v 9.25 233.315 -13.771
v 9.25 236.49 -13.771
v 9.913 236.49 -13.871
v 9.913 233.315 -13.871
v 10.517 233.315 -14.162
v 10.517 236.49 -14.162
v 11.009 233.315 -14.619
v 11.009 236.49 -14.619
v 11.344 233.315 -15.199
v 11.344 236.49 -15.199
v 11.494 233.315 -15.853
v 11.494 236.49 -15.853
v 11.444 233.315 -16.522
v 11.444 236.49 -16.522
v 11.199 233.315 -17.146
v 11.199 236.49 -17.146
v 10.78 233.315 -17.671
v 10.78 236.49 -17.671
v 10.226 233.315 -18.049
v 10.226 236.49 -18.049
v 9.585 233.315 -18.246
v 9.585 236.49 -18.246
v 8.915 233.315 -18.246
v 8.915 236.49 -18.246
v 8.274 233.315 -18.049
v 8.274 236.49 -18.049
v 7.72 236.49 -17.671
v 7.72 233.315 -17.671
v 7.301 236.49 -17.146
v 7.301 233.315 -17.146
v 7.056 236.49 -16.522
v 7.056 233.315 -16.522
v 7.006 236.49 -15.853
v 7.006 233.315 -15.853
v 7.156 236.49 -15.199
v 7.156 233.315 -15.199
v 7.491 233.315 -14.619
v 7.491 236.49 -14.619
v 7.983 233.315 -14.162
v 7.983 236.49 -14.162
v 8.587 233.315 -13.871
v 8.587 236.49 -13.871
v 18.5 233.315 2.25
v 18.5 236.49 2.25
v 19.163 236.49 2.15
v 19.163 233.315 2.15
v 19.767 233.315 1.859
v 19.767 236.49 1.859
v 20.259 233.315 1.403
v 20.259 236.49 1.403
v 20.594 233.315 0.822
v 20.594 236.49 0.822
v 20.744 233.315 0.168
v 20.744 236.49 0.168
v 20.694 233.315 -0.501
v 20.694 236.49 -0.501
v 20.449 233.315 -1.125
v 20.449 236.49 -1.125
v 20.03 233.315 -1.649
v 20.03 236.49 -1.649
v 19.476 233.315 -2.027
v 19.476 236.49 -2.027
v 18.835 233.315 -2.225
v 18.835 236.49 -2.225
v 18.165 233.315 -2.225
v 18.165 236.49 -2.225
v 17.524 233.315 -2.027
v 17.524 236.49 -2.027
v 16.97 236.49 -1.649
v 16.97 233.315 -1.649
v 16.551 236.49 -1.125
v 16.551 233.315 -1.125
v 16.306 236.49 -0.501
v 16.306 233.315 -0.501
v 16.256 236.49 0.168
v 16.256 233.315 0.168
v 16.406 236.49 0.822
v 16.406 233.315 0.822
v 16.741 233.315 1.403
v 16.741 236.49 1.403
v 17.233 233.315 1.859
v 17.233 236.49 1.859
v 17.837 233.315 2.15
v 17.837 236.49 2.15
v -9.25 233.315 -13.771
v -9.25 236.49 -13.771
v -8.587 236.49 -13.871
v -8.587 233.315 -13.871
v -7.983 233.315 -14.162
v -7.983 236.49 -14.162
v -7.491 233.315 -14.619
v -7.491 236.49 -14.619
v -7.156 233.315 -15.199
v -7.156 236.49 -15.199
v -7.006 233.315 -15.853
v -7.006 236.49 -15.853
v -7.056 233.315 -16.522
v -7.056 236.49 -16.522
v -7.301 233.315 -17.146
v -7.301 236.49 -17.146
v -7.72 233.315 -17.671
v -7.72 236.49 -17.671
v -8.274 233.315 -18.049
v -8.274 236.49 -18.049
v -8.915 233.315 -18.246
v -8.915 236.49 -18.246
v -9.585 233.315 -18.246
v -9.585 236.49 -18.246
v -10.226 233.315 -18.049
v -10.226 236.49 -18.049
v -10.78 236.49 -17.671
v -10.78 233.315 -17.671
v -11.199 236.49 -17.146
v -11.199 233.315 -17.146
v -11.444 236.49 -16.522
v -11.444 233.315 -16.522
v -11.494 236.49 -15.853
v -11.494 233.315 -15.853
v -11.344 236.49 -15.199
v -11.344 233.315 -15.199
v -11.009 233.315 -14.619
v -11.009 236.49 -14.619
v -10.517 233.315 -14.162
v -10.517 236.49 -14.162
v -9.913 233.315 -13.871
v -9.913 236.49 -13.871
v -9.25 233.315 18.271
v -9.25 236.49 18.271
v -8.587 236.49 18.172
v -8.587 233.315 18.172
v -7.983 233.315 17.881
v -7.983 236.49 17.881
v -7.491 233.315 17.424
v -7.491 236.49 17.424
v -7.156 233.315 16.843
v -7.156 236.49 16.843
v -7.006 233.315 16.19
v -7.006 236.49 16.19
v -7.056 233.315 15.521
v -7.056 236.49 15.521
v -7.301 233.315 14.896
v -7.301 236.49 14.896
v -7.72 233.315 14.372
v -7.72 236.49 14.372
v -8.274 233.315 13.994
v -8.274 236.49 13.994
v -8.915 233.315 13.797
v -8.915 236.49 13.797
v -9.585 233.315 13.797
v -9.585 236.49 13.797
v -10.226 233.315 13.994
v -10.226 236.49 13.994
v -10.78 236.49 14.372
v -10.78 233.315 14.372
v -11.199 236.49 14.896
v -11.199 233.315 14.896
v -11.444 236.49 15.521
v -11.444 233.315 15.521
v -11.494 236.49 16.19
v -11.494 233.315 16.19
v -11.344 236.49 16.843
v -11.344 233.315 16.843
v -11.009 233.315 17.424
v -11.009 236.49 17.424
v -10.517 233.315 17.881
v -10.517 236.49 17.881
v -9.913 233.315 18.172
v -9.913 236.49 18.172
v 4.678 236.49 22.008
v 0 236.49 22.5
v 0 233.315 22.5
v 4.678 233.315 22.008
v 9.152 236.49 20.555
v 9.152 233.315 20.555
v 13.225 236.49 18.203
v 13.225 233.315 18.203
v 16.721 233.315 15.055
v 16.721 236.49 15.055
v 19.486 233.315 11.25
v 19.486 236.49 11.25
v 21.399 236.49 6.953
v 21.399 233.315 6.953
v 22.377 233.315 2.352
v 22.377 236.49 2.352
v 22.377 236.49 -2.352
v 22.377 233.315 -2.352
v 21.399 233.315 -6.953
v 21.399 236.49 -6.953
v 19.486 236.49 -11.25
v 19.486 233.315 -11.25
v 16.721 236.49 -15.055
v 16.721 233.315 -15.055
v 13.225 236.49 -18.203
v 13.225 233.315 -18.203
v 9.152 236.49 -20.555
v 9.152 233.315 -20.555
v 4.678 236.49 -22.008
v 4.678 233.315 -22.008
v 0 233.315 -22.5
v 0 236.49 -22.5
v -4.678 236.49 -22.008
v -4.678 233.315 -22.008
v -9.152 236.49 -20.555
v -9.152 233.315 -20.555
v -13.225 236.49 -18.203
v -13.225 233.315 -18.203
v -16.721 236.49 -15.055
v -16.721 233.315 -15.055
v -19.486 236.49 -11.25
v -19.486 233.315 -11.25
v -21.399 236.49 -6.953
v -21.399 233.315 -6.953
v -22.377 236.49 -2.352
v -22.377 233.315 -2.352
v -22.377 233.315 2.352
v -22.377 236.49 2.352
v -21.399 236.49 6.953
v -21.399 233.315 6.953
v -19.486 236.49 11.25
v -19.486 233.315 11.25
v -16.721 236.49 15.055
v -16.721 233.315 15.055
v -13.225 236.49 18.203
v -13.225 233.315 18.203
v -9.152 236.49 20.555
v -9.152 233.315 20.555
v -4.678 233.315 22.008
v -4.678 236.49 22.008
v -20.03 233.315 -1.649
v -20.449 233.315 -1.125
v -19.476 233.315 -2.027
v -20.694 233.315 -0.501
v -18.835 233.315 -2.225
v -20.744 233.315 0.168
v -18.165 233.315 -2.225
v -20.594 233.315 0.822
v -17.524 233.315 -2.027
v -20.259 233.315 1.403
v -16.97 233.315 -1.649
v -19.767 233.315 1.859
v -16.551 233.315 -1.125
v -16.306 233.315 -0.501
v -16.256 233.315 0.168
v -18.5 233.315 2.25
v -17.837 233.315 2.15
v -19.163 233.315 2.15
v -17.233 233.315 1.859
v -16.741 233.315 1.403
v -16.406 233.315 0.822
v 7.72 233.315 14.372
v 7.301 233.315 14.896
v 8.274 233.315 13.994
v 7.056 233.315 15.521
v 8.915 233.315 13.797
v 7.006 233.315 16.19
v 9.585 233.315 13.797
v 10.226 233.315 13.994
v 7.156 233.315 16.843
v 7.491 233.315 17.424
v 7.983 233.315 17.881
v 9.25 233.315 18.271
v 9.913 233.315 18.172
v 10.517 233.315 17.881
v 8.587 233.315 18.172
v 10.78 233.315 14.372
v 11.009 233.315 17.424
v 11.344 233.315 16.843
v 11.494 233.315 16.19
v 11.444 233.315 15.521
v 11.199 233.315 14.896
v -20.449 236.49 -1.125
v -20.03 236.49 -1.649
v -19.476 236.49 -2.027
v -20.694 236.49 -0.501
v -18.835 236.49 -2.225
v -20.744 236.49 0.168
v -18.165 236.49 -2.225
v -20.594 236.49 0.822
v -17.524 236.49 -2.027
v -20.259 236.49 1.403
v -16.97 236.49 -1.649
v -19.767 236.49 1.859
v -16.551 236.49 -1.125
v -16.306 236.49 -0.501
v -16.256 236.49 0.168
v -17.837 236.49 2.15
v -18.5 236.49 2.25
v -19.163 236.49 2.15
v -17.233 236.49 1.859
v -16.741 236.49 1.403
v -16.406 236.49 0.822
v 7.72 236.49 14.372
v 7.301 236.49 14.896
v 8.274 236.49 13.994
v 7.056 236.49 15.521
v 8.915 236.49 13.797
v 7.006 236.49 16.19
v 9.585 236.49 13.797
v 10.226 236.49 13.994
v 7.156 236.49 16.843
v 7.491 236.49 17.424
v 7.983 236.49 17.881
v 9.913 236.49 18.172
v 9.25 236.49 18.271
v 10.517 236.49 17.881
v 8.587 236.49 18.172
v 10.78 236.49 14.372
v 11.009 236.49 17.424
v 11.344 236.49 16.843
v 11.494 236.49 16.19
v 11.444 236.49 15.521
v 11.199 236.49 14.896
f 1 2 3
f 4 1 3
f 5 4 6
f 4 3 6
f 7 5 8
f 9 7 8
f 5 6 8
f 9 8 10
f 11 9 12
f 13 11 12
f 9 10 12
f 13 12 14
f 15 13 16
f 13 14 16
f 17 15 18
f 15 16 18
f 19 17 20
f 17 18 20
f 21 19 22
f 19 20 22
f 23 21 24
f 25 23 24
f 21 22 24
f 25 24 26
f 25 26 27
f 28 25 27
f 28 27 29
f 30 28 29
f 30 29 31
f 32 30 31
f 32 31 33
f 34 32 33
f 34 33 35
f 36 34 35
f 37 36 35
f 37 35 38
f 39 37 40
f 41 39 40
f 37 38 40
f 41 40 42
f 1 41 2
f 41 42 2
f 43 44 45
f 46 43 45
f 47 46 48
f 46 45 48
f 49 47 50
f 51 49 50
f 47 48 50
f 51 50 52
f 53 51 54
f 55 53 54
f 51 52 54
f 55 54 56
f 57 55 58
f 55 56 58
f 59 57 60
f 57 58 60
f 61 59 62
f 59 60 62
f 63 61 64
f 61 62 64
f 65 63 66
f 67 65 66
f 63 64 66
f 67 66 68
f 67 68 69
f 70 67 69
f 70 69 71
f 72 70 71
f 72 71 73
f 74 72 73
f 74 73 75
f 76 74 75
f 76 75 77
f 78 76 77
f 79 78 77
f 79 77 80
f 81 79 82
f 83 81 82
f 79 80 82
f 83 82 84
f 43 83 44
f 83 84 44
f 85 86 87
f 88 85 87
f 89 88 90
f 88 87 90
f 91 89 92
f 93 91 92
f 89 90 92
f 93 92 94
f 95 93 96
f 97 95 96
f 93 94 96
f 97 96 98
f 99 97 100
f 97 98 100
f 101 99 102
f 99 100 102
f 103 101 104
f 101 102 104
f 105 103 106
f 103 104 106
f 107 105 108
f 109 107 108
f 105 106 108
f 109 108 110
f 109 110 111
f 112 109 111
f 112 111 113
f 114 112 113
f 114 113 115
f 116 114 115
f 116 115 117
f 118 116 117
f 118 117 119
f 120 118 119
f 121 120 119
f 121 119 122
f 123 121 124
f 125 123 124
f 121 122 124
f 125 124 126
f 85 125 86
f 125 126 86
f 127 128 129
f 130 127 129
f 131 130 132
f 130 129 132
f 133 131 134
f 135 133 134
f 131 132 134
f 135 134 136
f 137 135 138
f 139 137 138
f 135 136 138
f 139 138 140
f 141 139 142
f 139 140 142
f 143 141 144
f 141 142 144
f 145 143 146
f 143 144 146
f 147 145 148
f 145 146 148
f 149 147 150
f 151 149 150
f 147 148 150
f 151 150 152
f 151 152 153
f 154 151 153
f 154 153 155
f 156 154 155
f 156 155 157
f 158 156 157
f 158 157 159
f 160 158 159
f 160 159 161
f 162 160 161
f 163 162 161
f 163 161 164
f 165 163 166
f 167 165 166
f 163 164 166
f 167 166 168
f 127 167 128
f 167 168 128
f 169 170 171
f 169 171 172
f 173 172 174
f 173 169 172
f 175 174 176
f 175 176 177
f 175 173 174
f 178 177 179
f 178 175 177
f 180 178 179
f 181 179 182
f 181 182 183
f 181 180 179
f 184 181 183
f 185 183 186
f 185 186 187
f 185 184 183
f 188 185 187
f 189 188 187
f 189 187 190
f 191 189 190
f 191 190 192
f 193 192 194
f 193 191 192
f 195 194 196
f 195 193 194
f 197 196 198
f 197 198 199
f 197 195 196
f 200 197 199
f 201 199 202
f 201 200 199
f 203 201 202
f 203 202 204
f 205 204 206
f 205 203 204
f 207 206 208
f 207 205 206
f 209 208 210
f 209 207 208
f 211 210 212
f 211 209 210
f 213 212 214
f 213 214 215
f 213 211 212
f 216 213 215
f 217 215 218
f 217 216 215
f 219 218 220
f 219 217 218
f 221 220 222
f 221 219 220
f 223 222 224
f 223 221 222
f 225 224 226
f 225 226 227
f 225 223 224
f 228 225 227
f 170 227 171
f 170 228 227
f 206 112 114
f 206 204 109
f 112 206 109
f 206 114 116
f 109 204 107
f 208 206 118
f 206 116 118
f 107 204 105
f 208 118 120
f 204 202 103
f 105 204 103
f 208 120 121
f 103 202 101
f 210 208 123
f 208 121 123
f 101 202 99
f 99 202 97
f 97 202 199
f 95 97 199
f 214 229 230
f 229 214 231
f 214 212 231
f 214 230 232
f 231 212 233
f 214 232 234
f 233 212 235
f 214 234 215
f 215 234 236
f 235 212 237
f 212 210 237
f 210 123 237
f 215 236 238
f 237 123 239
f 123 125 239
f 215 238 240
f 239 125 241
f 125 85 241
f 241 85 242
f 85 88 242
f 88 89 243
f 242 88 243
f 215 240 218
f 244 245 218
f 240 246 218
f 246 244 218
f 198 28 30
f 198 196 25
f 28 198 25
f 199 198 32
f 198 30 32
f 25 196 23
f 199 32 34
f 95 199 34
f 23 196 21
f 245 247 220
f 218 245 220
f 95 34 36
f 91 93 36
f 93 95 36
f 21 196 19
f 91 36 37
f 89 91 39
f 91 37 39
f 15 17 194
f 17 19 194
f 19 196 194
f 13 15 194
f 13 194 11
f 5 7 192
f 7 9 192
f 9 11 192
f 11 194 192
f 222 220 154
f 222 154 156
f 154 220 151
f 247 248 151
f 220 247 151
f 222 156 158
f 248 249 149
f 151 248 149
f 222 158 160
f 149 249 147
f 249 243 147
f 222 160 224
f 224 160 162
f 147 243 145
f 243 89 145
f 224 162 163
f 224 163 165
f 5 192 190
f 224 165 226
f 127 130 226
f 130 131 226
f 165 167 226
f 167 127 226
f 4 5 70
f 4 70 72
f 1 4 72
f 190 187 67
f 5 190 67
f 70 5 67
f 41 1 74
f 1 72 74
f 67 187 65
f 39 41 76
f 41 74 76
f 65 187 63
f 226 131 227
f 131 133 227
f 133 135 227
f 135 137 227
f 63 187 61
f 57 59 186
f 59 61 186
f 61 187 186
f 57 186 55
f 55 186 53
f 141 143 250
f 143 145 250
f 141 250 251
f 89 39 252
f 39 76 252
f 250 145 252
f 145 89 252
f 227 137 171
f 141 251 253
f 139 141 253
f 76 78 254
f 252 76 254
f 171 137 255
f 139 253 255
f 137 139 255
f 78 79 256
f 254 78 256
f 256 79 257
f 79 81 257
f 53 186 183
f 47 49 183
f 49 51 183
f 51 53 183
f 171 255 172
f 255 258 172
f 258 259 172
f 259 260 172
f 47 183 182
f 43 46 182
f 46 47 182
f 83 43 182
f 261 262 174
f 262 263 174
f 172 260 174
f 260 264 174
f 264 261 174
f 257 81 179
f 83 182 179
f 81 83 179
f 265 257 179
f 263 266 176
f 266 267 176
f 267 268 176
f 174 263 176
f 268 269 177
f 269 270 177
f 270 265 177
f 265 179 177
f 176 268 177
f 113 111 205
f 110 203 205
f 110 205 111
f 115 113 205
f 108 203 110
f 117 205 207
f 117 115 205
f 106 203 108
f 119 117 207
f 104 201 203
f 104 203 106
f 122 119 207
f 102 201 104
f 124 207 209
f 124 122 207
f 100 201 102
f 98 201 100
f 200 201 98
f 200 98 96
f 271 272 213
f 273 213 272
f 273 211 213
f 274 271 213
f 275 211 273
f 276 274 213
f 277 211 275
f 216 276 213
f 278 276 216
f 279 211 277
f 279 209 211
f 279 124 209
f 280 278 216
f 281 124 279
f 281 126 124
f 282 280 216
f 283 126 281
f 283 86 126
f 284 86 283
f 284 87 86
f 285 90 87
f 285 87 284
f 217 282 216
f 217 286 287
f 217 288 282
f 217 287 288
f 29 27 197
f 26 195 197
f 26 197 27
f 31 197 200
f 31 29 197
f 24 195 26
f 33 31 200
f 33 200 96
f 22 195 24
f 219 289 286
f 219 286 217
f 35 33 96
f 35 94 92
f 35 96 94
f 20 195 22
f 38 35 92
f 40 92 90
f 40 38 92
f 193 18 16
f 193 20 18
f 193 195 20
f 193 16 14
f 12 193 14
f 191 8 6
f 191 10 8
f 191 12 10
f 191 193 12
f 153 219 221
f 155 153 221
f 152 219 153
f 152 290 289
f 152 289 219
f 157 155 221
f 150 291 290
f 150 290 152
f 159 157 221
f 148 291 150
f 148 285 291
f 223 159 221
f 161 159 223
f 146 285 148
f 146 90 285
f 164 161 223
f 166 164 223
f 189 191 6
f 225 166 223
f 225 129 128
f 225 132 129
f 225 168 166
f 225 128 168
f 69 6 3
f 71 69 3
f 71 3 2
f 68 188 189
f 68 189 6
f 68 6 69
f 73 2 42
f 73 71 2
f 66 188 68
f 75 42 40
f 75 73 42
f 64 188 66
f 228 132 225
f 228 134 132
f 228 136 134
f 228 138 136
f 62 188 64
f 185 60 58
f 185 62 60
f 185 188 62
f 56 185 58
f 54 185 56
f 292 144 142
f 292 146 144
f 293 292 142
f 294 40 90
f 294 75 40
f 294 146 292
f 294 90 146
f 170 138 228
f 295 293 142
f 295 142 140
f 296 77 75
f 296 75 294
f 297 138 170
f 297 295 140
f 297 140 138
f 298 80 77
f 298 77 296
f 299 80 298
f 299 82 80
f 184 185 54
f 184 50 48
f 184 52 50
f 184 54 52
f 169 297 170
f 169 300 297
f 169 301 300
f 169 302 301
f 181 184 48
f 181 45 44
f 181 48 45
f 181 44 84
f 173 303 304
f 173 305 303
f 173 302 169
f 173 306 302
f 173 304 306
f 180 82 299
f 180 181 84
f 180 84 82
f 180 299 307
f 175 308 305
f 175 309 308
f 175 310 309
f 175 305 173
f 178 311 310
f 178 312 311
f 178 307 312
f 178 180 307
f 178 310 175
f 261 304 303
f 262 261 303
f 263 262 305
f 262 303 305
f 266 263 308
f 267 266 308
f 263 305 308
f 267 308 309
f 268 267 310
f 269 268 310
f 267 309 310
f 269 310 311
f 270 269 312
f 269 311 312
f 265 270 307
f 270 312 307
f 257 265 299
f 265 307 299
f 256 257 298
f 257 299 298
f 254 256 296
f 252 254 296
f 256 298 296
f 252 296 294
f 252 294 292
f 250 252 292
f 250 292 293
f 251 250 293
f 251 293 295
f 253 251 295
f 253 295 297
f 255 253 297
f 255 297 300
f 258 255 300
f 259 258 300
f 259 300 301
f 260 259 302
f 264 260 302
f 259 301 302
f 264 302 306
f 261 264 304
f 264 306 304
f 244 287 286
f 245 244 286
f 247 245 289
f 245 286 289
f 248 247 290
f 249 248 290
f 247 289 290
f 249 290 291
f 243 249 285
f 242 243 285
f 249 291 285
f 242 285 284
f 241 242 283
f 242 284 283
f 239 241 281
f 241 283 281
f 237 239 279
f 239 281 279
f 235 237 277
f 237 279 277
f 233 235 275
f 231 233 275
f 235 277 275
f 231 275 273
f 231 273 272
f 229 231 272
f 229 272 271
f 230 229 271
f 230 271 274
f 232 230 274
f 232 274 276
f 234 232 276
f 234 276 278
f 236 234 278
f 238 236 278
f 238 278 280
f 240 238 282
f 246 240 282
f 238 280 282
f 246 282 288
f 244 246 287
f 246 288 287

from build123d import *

# Parameters (mm, degrees)
SKETCH2_R           = 22.5
SKETCH2_R_2         = 2.25
BOSS_EXTRUDE1_DEPTH = 3.175


with BuildPart() as part:
    # Sketch2 → Boss-Extrude1 (new body)
    with BuildSketch(Plane(origin=(0, 236.49, 0), x_dir=(1, 0, 0), z_dir=(0, 1, 0))):
        with Locations(Location((0, 0, 0), (0, 0, 270))):
            Circle(SKETCH2_R)
        with Locations(Location((9.25, 16.02146997, 0), (0, 0, 270))):
            Circle(SKETCH2_R_2, mode=Mode.SUBTRACT)
        with Locations(Location((18.5, 0, 0), (0, 0, 270))):
            Circle(SKETCH2_R_2, mode=Mode.SUBTRACT)
        with Locations(Location((9.25, -16.02146997, 0), (0, 0, 270))):
            Circle(SKETCH2_R_2, mode=Mode.SUBTRACT)
        with Locations(Location((-9.25, -16.02146997, 0), (0, 0, 270))):
            Circle(SKETCH2_R_2, mode=Mode.SUBTRACT)
        with Locations(Location((-18.5, 0, 0), (0, 0, 270))):
            Circle(SKETCH2_R_2, mode=Mode.SUBTRACT)
        with Locations(Location((-9.25, 16.02146997, 0), (0, 0, 270))):
            Circle(SKETCH2_R_2, mode=Mode.SUBTRACT)
    extrude(amount=-BOSS_EXTRUDE1_DEPTH)


solid = part.part
